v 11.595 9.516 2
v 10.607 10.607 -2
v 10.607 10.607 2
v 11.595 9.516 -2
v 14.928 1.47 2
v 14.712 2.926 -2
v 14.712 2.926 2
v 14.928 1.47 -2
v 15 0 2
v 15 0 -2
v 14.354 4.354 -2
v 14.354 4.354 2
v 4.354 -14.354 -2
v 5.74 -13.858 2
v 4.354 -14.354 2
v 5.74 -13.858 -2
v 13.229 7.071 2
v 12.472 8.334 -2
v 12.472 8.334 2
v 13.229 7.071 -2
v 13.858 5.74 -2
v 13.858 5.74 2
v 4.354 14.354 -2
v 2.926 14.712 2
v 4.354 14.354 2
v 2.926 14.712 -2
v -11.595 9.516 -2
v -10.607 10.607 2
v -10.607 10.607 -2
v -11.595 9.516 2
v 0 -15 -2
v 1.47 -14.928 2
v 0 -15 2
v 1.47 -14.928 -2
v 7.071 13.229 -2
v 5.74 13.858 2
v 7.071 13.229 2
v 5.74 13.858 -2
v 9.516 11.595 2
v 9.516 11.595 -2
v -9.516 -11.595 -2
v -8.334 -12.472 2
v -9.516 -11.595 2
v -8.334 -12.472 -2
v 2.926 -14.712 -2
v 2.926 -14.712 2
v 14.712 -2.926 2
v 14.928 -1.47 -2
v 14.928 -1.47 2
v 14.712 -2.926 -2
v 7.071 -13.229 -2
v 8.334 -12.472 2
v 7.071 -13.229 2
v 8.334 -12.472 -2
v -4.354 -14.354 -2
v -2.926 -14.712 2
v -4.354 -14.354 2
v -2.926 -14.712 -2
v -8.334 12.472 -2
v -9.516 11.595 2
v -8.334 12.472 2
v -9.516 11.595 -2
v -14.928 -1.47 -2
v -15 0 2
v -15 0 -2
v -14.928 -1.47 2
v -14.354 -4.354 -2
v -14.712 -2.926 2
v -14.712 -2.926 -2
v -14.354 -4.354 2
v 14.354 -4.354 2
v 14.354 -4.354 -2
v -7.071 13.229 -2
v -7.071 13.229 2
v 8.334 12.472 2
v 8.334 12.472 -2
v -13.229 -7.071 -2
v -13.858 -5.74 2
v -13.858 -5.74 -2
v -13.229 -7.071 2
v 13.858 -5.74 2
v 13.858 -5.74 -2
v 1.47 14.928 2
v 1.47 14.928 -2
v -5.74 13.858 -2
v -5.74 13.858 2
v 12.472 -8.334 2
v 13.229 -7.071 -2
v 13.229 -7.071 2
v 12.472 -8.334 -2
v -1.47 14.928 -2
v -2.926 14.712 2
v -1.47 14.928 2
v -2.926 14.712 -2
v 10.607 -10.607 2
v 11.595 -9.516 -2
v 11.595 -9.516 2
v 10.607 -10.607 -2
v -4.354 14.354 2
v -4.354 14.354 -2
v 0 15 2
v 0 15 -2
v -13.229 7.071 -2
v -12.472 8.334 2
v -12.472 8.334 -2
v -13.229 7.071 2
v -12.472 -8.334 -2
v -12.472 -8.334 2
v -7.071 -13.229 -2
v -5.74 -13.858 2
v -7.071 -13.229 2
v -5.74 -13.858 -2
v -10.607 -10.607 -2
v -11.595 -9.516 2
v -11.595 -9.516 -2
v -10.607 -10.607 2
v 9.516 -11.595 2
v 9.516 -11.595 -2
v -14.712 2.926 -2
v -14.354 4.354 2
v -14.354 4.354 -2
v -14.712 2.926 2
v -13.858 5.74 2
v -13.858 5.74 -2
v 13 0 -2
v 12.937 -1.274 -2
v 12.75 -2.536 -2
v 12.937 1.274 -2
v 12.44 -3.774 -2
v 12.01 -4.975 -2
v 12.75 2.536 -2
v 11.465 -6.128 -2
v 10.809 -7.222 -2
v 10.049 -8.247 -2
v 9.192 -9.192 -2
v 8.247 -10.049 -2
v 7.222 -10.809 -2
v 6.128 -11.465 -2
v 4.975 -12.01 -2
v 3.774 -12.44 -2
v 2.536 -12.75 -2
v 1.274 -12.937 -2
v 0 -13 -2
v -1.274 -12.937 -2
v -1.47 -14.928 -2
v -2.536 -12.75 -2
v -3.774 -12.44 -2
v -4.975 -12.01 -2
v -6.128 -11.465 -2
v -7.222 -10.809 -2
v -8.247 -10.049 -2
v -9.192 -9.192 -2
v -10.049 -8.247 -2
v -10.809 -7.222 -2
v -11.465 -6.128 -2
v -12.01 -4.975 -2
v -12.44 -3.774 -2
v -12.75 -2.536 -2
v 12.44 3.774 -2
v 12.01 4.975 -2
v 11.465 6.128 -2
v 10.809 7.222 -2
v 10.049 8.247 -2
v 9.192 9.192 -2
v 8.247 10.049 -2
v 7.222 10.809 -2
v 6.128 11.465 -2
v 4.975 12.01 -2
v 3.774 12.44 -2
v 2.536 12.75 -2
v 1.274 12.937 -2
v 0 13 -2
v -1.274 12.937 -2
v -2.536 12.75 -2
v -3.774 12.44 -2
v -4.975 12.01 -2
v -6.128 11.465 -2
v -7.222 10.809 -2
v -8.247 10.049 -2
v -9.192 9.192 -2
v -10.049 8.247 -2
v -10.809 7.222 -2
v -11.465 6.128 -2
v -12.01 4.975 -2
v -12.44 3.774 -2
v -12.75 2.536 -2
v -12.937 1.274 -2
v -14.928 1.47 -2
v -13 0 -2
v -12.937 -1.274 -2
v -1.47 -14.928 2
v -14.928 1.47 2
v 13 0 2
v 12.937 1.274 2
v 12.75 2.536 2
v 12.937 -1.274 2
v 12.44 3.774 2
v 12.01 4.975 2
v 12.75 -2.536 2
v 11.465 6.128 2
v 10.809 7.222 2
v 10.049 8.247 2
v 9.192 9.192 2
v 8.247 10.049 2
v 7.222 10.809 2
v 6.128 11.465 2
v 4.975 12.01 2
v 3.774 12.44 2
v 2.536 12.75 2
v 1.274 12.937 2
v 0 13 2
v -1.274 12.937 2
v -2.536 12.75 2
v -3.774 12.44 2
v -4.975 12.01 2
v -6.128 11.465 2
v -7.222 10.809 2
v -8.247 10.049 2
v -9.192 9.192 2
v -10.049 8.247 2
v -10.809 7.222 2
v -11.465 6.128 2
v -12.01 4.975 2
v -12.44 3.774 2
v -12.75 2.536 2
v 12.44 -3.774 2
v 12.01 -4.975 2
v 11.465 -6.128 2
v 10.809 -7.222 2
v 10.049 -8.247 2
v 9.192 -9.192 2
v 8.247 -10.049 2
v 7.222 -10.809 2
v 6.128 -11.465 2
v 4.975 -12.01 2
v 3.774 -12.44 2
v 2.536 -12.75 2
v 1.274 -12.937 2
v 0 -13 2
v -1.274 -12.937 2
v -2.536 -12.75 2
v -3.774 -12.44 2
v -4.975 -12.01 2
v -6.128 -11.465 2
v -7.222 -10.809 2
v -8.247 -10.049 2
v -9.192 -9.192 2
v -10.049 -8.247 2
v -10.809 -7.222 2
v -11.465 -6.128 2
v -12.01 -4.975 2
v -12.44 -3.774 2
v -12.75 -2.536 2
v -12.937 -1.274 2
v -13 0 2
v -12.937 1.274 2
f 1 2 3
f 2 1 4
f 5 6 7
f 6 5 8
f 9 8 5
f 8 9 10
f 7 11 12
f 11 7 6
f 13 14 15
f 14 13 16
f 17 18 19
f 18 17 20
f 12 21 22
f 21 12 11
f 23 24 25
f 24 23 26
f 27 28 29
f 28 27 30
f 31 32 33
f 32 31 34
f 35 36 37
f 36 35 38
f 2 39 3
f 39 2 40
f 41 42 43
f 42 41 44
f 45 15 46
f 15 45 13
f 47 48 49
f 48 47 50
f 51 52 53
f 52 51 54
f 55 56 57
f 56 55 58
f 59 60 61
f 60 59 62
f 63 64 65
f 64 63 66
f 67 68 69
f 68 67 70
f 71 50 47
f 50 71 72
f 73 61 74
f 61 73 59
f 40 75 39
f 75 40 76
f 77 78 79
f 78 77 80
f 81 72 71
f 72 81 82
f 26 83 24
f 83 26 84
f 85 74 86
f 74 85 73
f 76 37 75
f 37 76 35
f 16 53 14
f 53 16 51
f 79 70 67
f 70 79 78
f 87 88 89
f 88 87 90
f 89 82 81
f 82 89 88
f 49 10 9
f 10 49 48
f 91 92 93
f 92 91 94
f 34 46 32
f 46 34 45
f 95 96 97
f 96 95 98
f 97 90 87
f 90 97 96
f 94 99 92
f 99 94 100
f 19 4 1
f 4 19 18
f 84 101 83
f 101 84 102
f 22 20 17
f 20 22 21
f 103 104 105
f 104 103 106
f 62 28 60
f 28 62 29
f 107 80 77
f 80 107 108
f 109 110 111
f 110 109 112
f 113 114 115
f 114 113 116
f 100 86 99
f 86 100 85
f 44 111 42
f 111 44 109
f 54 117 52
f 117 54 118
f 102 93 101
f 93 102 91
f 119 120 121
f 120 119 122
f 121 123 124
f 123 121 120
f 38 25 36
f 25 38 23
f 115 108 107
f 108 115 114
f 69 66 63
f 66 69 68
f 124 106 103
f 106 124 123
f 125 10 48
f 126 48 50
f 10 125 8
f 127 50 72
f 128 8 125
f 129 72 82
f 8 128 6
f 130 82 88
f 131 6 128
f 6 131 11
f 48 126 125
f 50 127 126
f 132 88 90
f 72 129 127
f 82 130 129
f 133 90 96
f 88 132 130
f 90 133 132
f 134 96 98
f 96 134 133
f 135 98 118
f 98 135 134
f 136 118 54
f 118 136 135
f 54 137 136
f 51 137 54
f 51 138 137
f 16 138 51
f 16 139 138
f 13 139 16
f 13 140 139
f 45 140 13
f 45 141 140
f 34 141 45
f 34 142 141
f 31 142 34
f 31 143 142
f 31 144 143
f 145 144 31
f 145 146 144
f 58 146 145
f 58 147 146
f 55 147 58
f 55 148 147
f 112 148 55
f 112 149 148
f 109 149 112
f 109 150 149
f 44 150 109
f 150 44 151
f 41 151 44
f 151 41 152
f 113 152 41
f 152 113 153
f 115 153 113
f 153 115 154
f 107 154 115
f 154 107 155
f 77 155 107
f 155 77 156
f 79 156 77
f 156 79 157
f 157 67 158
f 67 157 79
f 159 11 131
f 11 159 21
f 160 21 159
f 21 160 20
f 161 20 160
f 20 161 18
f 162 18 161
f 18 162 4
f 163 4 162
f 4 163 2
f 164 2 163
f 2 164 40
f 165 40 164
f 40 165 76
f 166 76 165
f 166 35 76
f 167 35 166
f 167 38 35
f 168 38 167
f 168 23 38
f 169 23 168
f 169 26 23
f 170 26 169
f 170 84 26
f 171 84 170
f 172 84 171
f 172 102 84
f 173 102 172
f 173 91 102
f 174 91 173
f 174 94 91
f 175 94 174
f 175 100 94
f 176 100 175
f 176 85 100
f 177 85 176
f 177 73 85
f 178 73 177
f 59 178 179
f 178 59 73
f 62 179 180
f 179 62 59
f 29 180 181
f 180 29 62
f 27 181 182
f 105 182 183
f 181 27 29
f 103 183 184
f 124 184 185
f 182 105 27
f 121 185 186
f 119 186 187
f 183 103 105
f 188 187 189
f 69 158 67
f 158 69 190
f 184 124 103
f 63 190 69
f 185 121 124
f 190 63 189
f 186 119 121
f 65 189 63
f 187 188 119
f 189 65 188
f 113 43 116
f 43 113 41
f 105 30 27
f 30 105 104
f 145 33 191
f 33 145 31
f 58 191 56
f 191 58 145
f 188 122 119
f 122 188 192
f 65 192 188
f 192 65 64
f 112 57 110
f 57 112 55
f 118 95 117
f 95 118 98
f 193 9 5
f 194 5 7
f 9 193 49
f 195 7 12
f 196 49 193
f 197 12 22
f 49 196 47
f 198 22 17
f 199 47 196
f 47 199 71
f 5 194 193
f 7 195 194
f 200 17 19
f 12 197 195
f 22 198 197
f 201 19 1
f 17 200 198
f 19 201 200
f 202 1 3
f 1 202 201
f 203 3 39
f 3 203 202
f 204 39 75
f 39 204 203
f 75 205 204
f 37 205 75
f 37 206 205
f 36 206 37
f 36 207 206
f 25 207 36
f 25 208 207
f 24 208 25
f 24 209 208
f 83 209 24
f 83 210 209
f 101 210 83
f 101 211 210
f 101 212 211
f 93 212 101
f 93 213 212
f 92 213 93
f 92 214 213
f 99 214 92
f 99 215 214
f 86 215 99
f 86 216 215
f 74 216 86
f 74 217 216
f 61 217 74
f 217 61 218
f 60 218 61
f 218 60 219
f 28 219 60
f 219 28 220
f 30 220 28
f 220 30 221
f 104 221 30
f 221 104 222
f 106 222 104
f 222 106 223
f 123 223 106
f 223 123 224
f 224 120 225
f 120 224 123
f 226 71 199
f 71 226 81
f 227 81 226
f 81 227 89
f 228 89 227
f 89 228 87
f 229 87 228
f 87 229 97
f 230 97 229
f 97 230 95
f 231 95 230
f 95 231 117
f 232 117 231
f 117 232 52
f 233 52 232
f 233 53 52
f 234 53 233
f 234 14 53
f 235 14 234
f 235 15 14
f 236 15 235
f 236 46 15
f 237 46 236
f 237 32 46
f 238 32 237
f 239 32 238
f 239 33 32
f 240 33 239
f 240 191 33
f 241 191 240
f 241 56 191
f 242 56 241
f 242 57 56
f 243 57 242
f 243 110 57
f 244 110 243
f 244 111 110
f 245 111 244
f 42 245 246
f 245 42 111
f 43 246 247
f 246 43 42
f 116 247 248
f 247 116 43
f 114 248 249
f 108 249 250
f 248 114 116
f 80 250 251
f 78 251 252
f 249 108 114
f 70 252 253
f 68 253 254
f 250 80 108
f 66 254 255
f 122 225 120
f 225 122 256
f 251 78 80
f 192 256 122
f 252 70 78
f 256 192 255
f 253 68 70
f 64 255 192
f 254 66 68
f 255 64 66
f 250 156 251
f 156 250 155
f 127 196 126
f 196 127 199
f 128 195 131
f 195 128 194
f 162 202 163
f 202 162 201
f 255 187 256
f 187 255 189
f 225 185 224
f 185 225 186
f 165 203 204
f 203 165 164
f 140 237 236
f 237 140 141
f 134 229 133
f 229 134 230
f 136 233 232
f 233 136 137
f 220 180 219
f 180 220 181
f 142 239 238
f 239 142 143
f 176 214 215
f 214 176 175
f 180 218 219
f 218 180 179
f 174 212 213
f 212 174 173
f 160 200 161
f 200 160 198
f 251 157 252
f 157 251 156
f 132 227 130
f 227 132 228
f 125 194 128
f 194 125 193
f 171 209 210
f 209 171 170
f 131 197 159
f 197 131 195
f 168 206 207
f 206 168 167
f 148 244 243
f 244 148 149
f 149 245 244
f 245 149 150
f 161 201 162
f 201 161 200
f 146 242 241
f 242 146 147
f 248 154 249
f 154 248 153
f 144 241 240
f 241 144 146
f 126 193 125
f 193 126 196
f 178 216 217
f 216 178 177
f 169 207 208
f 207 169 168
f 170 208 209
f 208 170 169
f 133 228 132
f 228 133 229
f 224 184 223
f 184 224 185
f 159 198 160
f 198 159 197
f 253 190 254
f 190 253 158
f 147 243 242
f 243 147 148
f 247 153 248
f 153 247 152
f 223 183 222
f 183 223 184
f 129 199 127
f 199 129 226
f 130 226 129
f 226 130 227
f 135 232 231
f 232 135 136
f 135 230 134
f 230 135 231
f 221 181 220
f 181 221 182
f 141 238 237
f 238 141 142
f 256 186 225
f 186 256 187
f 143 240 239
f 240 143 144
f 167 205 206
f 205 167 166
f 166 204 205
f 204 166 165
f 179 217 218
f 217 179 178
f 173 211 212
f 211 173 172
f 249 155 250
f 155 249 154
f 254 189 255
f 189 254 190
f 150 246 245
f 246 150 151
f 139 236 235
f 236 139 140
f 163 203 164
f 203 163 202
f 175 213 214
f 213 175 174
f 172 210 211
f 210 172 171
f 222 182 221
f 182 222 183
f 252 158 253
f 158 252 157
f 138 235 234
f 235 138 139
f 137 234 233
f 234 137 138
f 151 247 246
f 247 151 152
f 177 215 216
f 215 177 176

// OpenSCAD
module Ring(hole_diameter, thickness, height){
    $fn=64;
  difference(){
    cylinder(h=height, d=hole_diameter+thickness, center=true);
    cylinder(h=height+1, d=hole_diameter, center=true);
  }
}

Ring(26, 4, 4);
